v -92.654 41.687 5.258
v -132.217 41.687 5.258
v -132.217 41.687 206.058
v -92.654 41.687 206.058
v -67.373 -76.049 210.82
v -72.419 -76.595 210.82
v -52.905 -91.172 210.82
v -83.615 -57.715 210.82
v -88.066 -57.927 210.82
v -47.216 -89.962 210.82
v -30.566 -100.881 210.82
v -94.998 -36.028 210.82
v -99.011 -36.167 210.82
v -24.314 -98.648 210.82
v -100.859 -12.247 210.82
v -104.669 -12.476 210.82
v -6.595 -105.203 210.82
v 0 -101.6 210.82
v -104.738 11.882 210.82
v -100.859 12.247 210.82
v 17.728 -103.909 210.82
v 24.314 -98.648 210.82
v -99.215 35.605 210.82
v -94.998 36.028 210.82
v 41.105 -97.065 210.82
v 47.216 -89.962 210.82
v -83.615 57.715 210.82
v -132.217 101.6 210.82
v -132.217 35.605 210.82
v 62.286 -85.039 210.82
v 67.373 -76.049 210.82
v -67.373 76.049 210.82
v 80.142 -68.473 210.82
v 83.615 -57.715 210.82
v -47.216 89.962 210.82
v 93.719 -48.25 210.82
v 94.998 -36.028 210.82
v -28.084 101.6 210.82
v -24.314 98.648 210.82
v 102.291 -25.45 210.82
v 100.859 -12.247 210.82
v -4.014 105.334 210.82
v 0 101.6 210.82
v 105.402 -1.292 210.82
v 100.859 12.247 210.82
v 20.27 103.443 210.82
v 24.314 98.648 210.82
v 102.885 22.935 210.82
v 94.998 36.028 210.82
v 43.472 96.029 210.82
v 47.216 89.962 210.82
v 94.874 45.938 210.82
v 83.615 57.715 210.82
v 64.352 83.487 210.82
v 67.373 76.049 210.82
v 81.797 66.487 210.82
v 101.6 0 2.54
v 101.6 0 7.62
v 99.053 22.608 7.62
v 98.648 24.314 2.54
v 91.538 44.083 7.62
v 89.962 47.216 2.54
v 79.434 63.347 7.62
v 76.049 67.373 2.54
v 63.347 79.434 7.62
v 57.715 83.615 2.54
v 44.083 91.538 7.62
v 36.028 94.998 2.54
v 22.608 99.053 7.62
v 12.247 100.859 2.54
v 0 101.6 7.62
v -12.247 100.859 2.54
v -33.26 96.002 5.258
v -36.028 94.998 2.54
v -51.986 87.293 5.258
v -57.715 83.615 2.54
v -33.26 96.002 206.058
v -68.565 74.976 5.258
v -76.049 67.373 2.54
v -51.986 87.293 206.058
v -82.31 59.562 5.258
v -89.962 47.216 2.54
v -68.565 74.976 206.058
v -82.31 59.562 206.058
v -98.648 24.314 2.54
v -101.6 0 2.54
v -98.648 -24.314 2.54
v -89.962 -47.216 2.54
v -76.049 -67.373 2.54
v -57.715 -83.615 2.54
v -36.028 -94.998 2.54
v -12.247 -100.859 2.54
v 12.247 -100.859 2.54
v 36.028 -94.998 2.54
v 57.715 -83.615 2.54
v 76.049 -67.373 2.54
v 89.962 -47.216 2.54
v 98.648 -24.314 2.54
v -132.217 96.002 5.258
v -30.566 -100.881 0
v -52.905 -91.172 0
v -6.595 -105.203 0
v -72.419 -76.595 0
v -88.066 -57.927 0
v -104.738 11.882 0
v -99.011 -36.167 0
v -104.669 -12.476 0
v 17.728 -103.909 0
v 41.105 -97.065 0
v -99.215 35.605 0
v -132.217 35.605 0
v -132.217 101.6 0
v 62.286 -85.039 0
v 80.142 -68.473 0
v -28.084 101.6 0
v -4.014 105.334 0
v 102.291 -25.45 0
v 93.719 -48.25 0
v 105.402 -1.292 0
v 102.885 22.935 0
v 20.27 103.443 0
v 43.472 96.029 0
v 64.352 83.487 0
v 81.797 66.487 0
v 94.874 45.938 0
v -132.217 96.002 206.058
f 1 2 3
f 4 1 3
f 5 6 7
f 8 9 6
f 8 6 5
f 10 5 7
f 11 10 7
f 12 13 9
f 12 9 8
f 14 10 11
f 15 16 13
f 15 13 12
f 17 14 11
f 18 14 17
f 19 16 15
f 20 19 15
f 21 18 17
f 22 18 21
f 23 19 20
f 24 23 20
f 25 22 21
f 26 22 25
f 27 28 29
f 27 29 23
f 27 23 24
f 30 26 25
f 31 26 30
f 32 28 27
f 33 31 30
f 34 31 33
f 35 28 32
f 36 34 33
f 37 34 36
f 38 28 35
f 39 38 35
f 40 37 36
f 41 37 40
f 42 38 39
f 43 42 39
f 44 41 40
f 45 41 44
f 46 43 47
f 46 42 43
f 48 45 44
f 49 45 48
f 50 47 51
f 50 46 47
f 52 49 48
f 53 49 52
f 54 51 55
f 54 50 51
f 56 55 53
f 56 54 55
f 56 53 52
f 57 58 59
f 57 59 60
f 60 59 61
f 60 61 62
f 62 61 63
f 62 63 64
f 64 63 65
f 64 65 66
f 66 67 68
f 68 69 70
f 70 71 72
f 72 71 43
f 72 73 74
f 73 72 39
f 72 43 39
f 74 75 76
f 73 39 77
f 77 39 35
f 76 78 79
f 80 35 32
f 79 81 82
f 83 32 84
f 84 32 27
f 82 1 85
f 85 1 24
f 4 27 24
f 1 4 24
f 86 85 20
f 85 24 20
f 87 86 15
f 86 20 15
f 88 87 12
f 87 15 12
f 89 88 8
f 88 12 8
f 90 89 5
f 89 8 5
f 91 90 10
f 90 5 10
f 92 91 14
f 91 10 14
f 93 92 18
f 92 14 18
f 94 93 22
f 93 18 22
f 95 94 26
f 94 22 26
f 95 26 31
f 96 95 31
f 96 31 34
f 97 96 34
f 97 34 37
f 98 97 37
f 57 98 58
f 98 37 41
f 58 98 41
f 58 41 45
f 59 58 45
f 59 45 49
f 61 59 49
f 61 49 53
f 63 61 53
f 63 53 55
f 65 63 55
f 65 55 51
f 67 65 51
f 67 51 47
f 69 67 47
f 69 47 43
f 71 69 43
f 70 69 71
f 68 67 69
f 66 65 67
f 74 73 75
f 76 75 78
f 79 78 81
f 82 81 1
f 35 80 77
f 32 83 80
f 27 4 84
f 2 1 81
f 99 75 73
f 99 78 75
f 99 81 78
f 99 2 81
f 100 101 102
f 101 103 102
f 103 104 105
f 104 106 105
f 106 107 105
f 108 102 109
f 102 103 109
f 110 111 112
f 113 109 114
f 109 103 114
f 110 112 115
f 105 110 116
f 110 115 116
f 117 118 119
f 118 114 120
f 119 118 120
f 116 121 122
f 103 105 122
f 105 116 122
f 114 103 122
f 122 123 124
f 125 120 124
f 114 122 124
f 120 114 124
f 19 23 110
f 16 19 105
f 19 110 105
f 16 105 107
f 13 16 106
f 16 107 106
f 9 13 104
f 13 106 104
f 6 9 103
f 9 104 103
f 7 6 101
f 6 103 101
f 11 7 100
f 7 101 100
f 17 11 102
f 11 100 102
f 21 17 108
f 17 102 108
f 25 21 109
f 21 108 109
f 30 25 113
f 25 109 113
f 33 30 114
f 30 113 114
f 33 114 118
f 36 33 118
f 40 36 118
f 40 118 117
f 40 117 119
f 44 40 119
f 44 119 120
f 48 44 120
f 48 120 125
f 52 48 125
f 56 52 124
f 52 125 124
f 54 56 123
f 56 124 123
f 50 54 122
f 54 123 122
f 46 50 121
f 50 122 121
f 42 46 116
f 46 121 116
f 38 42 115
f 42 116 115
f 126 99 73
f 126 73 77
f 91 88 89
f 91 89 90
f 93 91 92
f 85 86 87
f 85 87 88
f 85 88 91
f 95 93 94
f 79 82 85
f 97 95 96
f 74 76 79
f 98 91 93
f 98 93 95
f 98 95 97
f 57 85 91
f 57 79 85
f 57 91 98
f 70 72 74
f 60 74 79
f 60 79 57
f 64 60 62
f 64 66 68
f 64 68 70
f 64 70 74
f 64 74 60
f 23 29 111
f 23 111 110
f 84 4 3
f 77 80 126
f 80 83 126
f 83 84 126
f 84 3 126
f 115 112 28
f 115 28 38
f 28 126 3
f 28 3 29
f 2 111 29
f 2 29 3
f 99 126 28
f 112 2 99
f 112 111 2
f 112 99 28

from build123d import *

# Parameters (mm, degrees)
SKETCH1_R                = 105.41
BOSS_EXTRUDE1_DEPTH      = 210.82
SKETCH2_R                = 101.6
CUT_EXTRUDE1_DEPTH       = 203.2
BOSS_EXTRUDE2_DEPTH      = 203.2
BOSS_EXTRUDE2_DEPTH_BACK = 7.62
SKETCH3_W                = 132.216629509
SKETCH3_H                = 65.995330398
SKETCH4_W                = 200.799602593
SKETCH4_H                = 54.314646603
CUT_EXTRUDE2_DEPTH       = 147.574
SKETCH5_R                = 101.6
CUT_EXTRUDE3_DEPTH       = 147.574
SKETCH6_R                = 101.6
CUT_EXTRUDE4_DEPTH       = 60.706


with BuildPart() as part:
    # Sketch1 → Boss-Extrude1 (new body)
    with BuildSketch(Plane.XY):
        Circle(SKETCH1_R)
    extrude(amount=BOSS_EXTRUDE1_DEPTH)

    # Sketch2 → Cut-Extrude1 (cut)
    with BuildSketch(Plane.XY.offset(210.82)):
        Circle(SKETCH2_R)
    extrude(amount=-CUT_EXTRUDE1_DEPTH, mode=Mode.SUBTRACT)

    # Sketch3 → Boss-Extrude2 (add, two sides: drawn at the far end of the back side and taken through both)
    with BuildSketch(Plane.XY.offset(7.62).offset(-BOSS_EXTRUDE2_DEPTH_BACK)):
        with Locations((-66.108314755, 68.602334801)):
            Rectangle(SKETCH3_W, SKETCH3_H)
    extrude(amount=BOSS_EXTRUDE2_DEPTH + BOSS_EXTRUDE2_DEPTH_BACK)

    # Sketch4 → Cut-Extrude2 (cut)
    with BuildSketch(Plane.ZY.offset(132.216629509)):
        with Locations((105.657754662, 68.844414065)):
            Rectangle(SKETCH4_W, SKETCH4_H)
    extrude(amount=-CUT_EXTRUDE2_DEPTH, mode=Mode.SUBTRACT)

    # Sketch5 → Cut-Extrude3 (cut)
    with BuildSketch(Plane.XY.offset(210.82)):
        Circle(SKETCH5_R)
    extrude(amount=-CUT_EXTRUDE3_DEPTH, mode=Mode.SUBTRACT)

    # Sketch6 → Cut-Extrude4 (cut)
    with BuildSketch(Plane.XY.offset(63.246)):
        Circle(SKETCH6_R)
    extrude(amount=-CUT_EXTRUDE4_DEPTH, mode=Mode.SUBTRACT)


solid = part.part
